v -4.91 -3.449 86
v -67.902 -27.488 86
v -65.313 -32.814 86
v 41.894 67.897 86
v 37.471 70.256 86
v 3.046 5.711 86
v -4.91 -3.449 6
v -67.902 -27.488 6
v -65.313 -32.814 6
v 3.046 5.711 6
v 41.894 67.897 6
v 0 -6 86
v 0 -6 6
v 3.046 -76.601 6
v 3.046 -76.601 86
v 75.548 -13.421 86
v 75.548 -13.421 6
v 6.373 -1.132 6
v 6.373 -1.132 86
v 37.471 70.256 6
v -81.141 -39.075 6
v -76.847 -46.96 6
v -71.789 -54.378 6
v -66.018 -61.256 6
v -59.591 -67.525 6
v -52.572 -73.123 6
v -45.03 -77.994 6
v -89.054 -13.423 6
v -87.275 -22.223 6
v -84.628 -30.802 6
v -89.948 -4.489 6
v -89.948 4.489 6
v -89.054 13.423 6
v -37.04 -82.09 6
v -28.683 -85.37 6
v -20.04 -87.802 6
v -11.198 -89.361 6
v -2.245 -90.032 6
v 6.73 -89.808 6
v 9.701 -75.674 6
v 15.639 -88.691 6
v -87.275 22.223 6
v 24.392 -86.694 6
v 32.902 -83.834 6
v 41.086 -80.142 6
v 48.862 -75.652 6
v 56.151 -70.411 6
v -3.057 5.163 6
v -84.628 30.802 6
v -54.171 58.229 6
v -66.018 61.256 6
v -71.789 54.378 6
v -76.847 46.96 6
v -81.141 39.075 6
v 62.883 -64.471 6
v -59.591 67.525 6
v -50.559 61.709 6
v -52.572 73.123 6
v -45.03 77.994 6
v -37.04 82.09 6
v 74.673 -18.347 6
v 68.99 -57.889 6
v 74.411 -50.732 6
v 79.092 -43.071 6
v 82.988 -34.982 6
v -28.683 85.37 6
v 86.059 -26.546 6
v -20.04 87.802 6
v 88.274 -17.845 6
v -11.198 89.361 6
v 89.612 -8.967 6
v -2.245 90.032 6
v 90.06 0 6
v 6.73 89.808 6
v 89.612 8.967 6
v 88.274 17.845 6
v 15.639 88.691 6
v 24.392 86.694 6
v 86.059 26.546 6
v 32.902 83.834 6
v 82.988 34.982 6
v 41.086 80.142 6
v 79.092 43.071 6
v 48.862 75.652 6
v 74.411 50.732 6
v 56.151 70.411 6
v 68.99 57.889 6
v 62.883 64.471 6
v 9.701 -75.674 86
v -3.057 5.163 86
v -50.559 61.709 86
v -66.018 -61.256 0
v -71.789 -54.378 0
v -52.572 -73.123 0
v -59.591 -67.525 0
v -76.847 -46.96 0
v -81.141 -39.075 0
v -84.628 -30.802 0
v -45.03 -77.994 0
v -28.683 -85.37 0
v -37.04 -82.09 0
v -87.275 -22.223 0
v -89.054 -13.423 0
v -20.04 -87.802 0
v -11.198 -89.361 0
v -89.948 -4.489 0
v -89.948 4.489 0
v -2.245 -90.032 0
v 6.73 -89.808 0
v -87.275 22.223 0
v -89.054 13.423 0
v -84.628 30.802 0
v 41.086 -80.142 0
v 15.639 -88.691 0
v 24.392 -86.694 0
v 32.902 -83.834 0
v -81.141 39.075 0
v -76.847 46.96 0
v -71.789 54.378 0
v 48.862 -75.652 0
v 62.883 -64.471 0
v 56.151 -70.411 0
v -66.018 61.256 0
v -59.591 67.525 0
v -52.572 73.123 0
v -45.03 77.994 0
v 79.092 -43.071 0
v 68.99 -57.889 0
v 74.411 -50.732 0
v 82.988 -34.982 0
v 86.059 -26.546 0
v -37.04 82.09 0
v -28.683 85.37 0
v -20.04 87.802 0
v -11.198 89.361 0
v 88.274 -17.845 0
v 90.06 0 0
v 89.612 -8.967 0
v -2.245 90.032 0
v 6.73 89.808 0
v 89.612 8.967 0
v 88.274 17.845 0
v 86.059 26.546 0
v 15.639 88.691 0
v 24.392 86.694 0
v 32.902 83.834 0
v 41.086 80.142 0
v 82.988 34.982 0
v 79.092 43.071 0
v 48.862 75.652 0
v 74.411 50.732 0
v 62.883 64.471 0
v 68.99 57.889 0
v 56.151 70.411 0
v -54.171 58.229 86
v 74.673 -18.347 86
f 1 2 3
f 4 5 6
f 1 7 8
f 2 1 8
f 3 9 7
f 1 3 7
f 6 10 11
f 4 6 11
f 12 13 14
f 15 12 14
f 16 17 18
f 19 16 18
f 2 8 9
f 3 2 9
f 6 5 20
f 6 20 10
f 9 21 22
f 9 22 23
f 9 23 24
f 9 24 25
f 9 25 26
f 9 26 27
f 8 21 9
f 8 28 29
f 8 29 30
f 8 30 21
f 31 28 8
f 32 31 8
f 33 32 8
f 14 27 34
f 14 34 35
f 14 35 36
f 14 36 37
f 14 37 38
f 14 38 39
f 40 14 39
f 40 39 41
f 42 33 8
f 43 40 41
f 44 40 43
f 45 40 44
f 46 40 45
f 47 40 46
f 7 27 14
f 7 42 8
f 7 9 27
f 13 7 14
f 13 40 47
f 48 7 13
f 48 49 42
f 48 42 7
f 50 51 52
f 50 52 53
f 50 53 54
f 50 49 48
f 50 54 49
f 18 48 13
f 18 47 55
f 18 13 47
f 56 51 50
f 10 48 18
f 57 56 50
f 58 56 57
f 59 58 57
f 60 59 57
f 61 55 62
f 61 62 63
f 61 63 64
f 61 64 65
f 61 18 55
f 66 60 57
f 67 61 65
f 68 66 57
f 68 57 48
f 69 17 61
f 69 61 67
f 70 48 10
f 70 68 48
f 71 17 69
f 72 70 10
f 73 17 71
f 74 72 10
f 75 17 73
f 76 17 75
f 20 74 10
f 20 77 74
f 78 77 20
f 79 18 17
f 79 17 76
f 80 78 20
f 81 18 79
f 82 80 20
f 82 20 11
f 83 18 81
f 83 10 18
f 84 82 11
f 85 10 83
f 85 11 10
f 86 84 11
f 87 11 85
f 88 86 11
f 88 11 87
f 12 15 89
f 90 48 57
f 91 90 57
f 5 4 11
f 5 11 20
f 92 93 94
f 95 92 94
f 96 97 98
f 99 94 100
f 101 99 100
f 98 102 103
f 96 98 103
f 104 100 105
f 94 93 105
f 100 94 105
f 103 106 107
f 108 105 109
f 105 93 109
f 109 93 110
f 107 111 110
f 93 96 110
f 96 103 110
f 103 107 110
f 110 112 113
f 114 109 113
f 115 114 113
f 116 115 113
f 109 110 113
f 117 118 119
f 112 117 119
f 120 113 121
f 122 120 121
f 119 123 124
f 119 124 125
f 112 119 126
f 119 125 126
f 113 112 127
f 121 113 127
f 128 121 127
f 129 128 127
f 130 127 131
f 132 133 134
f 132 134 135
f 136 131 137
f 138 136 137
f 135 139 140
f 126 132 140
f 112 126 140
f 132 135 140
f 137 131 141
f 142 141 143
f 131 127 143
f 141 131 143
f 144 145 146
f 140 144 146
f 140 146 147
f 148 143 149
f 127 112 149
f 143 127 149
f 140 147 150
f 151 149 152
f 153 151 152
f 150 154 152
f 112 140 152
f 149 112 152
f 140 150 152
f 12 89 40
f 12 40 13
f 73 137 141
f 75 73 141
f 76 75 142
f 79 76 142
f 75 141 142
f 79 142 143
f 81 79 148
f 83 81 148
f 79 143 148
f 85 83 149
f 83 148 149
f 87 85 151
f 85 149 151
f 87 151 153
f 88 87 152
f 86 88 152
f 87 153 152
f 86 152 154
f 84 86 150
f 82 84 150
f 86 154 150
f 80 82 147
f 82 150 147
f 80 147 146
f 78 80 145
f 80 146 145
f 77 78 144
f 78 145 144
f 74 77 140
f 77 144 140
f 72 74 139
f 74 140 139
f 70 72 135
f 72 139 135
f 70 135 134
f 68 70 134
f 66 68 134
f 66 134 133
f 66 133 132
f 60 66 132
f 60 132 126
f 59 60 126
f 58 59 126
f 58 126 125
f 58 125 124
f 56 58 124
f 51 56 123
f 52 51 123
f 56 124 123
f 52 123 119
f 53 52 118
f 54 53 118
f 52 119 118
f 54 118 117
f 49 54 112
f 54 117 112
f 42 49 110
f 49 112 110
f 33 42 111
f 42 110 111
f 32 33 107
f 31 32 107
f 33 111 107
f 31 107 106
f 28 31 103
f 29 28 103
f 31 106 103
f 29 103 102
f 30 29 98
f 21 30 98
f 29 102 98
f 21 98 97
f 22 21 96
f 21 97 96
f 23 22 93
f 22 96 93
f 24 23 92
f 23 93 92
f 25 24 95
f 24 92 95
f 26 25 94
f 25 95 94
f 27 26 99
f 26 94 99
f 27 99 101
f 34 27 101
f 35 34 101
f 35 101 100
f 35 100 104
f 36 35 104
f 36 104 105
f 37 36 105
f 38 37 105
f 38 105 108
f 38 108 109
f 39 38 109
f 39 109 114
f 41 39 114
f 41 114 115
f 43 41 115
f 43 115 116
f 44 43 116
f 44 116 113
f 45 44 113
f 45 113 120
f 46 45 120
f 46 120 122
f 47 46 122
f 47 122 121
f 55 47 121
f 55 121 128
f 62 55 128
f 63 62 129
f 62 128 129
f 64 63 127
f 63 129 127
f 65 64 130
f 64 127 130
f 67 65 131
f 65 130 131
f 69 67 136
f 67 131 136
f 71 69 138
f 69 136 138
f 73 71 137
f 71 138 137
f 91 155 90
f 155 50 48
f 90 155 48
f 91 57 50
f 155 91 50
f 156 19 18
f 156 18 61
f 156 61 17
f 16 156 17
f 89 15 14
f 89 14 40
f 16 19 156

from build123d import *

# Parameters (mm, degrees)
F0_R     = 90.059663
F1_DEPTH = 6
F3_DEPTH = 80


with BuildPart() as f1:
    # F0 (on Top) → F1 (new body)
    with BuildSketch(Plane.XY):
        Circle(F0_R)
    extrude(amount=F1_DEPTH)

    # F2 (on face) → F3 (join)
    with BuildSketch(Plane.XY.offset(6)):
        Polygon((41.894139, 67.897459), (37.471054, 70.256495), (3.045908, 5.710936), align=None)
        Polygon((75.548055, -13.42053), (6.37266, -1.132054), (74.672942, -18.346794), align=None)
        Polygon((9.701488, -75.674326), (0, -6), (3.045908, -76.601053), align=None)
        Polygon((-54.17126, 58.228912), (-3.056724, 5.162987), (-50.558788, 61.708542), align=None)
        Polygon((-65.313227, -32.813866), (-4.909957, -3.448525), (-67.902333, -27.488185), align=None)
    extrude(amount=F3_DEPTH)


solid = f1.part
